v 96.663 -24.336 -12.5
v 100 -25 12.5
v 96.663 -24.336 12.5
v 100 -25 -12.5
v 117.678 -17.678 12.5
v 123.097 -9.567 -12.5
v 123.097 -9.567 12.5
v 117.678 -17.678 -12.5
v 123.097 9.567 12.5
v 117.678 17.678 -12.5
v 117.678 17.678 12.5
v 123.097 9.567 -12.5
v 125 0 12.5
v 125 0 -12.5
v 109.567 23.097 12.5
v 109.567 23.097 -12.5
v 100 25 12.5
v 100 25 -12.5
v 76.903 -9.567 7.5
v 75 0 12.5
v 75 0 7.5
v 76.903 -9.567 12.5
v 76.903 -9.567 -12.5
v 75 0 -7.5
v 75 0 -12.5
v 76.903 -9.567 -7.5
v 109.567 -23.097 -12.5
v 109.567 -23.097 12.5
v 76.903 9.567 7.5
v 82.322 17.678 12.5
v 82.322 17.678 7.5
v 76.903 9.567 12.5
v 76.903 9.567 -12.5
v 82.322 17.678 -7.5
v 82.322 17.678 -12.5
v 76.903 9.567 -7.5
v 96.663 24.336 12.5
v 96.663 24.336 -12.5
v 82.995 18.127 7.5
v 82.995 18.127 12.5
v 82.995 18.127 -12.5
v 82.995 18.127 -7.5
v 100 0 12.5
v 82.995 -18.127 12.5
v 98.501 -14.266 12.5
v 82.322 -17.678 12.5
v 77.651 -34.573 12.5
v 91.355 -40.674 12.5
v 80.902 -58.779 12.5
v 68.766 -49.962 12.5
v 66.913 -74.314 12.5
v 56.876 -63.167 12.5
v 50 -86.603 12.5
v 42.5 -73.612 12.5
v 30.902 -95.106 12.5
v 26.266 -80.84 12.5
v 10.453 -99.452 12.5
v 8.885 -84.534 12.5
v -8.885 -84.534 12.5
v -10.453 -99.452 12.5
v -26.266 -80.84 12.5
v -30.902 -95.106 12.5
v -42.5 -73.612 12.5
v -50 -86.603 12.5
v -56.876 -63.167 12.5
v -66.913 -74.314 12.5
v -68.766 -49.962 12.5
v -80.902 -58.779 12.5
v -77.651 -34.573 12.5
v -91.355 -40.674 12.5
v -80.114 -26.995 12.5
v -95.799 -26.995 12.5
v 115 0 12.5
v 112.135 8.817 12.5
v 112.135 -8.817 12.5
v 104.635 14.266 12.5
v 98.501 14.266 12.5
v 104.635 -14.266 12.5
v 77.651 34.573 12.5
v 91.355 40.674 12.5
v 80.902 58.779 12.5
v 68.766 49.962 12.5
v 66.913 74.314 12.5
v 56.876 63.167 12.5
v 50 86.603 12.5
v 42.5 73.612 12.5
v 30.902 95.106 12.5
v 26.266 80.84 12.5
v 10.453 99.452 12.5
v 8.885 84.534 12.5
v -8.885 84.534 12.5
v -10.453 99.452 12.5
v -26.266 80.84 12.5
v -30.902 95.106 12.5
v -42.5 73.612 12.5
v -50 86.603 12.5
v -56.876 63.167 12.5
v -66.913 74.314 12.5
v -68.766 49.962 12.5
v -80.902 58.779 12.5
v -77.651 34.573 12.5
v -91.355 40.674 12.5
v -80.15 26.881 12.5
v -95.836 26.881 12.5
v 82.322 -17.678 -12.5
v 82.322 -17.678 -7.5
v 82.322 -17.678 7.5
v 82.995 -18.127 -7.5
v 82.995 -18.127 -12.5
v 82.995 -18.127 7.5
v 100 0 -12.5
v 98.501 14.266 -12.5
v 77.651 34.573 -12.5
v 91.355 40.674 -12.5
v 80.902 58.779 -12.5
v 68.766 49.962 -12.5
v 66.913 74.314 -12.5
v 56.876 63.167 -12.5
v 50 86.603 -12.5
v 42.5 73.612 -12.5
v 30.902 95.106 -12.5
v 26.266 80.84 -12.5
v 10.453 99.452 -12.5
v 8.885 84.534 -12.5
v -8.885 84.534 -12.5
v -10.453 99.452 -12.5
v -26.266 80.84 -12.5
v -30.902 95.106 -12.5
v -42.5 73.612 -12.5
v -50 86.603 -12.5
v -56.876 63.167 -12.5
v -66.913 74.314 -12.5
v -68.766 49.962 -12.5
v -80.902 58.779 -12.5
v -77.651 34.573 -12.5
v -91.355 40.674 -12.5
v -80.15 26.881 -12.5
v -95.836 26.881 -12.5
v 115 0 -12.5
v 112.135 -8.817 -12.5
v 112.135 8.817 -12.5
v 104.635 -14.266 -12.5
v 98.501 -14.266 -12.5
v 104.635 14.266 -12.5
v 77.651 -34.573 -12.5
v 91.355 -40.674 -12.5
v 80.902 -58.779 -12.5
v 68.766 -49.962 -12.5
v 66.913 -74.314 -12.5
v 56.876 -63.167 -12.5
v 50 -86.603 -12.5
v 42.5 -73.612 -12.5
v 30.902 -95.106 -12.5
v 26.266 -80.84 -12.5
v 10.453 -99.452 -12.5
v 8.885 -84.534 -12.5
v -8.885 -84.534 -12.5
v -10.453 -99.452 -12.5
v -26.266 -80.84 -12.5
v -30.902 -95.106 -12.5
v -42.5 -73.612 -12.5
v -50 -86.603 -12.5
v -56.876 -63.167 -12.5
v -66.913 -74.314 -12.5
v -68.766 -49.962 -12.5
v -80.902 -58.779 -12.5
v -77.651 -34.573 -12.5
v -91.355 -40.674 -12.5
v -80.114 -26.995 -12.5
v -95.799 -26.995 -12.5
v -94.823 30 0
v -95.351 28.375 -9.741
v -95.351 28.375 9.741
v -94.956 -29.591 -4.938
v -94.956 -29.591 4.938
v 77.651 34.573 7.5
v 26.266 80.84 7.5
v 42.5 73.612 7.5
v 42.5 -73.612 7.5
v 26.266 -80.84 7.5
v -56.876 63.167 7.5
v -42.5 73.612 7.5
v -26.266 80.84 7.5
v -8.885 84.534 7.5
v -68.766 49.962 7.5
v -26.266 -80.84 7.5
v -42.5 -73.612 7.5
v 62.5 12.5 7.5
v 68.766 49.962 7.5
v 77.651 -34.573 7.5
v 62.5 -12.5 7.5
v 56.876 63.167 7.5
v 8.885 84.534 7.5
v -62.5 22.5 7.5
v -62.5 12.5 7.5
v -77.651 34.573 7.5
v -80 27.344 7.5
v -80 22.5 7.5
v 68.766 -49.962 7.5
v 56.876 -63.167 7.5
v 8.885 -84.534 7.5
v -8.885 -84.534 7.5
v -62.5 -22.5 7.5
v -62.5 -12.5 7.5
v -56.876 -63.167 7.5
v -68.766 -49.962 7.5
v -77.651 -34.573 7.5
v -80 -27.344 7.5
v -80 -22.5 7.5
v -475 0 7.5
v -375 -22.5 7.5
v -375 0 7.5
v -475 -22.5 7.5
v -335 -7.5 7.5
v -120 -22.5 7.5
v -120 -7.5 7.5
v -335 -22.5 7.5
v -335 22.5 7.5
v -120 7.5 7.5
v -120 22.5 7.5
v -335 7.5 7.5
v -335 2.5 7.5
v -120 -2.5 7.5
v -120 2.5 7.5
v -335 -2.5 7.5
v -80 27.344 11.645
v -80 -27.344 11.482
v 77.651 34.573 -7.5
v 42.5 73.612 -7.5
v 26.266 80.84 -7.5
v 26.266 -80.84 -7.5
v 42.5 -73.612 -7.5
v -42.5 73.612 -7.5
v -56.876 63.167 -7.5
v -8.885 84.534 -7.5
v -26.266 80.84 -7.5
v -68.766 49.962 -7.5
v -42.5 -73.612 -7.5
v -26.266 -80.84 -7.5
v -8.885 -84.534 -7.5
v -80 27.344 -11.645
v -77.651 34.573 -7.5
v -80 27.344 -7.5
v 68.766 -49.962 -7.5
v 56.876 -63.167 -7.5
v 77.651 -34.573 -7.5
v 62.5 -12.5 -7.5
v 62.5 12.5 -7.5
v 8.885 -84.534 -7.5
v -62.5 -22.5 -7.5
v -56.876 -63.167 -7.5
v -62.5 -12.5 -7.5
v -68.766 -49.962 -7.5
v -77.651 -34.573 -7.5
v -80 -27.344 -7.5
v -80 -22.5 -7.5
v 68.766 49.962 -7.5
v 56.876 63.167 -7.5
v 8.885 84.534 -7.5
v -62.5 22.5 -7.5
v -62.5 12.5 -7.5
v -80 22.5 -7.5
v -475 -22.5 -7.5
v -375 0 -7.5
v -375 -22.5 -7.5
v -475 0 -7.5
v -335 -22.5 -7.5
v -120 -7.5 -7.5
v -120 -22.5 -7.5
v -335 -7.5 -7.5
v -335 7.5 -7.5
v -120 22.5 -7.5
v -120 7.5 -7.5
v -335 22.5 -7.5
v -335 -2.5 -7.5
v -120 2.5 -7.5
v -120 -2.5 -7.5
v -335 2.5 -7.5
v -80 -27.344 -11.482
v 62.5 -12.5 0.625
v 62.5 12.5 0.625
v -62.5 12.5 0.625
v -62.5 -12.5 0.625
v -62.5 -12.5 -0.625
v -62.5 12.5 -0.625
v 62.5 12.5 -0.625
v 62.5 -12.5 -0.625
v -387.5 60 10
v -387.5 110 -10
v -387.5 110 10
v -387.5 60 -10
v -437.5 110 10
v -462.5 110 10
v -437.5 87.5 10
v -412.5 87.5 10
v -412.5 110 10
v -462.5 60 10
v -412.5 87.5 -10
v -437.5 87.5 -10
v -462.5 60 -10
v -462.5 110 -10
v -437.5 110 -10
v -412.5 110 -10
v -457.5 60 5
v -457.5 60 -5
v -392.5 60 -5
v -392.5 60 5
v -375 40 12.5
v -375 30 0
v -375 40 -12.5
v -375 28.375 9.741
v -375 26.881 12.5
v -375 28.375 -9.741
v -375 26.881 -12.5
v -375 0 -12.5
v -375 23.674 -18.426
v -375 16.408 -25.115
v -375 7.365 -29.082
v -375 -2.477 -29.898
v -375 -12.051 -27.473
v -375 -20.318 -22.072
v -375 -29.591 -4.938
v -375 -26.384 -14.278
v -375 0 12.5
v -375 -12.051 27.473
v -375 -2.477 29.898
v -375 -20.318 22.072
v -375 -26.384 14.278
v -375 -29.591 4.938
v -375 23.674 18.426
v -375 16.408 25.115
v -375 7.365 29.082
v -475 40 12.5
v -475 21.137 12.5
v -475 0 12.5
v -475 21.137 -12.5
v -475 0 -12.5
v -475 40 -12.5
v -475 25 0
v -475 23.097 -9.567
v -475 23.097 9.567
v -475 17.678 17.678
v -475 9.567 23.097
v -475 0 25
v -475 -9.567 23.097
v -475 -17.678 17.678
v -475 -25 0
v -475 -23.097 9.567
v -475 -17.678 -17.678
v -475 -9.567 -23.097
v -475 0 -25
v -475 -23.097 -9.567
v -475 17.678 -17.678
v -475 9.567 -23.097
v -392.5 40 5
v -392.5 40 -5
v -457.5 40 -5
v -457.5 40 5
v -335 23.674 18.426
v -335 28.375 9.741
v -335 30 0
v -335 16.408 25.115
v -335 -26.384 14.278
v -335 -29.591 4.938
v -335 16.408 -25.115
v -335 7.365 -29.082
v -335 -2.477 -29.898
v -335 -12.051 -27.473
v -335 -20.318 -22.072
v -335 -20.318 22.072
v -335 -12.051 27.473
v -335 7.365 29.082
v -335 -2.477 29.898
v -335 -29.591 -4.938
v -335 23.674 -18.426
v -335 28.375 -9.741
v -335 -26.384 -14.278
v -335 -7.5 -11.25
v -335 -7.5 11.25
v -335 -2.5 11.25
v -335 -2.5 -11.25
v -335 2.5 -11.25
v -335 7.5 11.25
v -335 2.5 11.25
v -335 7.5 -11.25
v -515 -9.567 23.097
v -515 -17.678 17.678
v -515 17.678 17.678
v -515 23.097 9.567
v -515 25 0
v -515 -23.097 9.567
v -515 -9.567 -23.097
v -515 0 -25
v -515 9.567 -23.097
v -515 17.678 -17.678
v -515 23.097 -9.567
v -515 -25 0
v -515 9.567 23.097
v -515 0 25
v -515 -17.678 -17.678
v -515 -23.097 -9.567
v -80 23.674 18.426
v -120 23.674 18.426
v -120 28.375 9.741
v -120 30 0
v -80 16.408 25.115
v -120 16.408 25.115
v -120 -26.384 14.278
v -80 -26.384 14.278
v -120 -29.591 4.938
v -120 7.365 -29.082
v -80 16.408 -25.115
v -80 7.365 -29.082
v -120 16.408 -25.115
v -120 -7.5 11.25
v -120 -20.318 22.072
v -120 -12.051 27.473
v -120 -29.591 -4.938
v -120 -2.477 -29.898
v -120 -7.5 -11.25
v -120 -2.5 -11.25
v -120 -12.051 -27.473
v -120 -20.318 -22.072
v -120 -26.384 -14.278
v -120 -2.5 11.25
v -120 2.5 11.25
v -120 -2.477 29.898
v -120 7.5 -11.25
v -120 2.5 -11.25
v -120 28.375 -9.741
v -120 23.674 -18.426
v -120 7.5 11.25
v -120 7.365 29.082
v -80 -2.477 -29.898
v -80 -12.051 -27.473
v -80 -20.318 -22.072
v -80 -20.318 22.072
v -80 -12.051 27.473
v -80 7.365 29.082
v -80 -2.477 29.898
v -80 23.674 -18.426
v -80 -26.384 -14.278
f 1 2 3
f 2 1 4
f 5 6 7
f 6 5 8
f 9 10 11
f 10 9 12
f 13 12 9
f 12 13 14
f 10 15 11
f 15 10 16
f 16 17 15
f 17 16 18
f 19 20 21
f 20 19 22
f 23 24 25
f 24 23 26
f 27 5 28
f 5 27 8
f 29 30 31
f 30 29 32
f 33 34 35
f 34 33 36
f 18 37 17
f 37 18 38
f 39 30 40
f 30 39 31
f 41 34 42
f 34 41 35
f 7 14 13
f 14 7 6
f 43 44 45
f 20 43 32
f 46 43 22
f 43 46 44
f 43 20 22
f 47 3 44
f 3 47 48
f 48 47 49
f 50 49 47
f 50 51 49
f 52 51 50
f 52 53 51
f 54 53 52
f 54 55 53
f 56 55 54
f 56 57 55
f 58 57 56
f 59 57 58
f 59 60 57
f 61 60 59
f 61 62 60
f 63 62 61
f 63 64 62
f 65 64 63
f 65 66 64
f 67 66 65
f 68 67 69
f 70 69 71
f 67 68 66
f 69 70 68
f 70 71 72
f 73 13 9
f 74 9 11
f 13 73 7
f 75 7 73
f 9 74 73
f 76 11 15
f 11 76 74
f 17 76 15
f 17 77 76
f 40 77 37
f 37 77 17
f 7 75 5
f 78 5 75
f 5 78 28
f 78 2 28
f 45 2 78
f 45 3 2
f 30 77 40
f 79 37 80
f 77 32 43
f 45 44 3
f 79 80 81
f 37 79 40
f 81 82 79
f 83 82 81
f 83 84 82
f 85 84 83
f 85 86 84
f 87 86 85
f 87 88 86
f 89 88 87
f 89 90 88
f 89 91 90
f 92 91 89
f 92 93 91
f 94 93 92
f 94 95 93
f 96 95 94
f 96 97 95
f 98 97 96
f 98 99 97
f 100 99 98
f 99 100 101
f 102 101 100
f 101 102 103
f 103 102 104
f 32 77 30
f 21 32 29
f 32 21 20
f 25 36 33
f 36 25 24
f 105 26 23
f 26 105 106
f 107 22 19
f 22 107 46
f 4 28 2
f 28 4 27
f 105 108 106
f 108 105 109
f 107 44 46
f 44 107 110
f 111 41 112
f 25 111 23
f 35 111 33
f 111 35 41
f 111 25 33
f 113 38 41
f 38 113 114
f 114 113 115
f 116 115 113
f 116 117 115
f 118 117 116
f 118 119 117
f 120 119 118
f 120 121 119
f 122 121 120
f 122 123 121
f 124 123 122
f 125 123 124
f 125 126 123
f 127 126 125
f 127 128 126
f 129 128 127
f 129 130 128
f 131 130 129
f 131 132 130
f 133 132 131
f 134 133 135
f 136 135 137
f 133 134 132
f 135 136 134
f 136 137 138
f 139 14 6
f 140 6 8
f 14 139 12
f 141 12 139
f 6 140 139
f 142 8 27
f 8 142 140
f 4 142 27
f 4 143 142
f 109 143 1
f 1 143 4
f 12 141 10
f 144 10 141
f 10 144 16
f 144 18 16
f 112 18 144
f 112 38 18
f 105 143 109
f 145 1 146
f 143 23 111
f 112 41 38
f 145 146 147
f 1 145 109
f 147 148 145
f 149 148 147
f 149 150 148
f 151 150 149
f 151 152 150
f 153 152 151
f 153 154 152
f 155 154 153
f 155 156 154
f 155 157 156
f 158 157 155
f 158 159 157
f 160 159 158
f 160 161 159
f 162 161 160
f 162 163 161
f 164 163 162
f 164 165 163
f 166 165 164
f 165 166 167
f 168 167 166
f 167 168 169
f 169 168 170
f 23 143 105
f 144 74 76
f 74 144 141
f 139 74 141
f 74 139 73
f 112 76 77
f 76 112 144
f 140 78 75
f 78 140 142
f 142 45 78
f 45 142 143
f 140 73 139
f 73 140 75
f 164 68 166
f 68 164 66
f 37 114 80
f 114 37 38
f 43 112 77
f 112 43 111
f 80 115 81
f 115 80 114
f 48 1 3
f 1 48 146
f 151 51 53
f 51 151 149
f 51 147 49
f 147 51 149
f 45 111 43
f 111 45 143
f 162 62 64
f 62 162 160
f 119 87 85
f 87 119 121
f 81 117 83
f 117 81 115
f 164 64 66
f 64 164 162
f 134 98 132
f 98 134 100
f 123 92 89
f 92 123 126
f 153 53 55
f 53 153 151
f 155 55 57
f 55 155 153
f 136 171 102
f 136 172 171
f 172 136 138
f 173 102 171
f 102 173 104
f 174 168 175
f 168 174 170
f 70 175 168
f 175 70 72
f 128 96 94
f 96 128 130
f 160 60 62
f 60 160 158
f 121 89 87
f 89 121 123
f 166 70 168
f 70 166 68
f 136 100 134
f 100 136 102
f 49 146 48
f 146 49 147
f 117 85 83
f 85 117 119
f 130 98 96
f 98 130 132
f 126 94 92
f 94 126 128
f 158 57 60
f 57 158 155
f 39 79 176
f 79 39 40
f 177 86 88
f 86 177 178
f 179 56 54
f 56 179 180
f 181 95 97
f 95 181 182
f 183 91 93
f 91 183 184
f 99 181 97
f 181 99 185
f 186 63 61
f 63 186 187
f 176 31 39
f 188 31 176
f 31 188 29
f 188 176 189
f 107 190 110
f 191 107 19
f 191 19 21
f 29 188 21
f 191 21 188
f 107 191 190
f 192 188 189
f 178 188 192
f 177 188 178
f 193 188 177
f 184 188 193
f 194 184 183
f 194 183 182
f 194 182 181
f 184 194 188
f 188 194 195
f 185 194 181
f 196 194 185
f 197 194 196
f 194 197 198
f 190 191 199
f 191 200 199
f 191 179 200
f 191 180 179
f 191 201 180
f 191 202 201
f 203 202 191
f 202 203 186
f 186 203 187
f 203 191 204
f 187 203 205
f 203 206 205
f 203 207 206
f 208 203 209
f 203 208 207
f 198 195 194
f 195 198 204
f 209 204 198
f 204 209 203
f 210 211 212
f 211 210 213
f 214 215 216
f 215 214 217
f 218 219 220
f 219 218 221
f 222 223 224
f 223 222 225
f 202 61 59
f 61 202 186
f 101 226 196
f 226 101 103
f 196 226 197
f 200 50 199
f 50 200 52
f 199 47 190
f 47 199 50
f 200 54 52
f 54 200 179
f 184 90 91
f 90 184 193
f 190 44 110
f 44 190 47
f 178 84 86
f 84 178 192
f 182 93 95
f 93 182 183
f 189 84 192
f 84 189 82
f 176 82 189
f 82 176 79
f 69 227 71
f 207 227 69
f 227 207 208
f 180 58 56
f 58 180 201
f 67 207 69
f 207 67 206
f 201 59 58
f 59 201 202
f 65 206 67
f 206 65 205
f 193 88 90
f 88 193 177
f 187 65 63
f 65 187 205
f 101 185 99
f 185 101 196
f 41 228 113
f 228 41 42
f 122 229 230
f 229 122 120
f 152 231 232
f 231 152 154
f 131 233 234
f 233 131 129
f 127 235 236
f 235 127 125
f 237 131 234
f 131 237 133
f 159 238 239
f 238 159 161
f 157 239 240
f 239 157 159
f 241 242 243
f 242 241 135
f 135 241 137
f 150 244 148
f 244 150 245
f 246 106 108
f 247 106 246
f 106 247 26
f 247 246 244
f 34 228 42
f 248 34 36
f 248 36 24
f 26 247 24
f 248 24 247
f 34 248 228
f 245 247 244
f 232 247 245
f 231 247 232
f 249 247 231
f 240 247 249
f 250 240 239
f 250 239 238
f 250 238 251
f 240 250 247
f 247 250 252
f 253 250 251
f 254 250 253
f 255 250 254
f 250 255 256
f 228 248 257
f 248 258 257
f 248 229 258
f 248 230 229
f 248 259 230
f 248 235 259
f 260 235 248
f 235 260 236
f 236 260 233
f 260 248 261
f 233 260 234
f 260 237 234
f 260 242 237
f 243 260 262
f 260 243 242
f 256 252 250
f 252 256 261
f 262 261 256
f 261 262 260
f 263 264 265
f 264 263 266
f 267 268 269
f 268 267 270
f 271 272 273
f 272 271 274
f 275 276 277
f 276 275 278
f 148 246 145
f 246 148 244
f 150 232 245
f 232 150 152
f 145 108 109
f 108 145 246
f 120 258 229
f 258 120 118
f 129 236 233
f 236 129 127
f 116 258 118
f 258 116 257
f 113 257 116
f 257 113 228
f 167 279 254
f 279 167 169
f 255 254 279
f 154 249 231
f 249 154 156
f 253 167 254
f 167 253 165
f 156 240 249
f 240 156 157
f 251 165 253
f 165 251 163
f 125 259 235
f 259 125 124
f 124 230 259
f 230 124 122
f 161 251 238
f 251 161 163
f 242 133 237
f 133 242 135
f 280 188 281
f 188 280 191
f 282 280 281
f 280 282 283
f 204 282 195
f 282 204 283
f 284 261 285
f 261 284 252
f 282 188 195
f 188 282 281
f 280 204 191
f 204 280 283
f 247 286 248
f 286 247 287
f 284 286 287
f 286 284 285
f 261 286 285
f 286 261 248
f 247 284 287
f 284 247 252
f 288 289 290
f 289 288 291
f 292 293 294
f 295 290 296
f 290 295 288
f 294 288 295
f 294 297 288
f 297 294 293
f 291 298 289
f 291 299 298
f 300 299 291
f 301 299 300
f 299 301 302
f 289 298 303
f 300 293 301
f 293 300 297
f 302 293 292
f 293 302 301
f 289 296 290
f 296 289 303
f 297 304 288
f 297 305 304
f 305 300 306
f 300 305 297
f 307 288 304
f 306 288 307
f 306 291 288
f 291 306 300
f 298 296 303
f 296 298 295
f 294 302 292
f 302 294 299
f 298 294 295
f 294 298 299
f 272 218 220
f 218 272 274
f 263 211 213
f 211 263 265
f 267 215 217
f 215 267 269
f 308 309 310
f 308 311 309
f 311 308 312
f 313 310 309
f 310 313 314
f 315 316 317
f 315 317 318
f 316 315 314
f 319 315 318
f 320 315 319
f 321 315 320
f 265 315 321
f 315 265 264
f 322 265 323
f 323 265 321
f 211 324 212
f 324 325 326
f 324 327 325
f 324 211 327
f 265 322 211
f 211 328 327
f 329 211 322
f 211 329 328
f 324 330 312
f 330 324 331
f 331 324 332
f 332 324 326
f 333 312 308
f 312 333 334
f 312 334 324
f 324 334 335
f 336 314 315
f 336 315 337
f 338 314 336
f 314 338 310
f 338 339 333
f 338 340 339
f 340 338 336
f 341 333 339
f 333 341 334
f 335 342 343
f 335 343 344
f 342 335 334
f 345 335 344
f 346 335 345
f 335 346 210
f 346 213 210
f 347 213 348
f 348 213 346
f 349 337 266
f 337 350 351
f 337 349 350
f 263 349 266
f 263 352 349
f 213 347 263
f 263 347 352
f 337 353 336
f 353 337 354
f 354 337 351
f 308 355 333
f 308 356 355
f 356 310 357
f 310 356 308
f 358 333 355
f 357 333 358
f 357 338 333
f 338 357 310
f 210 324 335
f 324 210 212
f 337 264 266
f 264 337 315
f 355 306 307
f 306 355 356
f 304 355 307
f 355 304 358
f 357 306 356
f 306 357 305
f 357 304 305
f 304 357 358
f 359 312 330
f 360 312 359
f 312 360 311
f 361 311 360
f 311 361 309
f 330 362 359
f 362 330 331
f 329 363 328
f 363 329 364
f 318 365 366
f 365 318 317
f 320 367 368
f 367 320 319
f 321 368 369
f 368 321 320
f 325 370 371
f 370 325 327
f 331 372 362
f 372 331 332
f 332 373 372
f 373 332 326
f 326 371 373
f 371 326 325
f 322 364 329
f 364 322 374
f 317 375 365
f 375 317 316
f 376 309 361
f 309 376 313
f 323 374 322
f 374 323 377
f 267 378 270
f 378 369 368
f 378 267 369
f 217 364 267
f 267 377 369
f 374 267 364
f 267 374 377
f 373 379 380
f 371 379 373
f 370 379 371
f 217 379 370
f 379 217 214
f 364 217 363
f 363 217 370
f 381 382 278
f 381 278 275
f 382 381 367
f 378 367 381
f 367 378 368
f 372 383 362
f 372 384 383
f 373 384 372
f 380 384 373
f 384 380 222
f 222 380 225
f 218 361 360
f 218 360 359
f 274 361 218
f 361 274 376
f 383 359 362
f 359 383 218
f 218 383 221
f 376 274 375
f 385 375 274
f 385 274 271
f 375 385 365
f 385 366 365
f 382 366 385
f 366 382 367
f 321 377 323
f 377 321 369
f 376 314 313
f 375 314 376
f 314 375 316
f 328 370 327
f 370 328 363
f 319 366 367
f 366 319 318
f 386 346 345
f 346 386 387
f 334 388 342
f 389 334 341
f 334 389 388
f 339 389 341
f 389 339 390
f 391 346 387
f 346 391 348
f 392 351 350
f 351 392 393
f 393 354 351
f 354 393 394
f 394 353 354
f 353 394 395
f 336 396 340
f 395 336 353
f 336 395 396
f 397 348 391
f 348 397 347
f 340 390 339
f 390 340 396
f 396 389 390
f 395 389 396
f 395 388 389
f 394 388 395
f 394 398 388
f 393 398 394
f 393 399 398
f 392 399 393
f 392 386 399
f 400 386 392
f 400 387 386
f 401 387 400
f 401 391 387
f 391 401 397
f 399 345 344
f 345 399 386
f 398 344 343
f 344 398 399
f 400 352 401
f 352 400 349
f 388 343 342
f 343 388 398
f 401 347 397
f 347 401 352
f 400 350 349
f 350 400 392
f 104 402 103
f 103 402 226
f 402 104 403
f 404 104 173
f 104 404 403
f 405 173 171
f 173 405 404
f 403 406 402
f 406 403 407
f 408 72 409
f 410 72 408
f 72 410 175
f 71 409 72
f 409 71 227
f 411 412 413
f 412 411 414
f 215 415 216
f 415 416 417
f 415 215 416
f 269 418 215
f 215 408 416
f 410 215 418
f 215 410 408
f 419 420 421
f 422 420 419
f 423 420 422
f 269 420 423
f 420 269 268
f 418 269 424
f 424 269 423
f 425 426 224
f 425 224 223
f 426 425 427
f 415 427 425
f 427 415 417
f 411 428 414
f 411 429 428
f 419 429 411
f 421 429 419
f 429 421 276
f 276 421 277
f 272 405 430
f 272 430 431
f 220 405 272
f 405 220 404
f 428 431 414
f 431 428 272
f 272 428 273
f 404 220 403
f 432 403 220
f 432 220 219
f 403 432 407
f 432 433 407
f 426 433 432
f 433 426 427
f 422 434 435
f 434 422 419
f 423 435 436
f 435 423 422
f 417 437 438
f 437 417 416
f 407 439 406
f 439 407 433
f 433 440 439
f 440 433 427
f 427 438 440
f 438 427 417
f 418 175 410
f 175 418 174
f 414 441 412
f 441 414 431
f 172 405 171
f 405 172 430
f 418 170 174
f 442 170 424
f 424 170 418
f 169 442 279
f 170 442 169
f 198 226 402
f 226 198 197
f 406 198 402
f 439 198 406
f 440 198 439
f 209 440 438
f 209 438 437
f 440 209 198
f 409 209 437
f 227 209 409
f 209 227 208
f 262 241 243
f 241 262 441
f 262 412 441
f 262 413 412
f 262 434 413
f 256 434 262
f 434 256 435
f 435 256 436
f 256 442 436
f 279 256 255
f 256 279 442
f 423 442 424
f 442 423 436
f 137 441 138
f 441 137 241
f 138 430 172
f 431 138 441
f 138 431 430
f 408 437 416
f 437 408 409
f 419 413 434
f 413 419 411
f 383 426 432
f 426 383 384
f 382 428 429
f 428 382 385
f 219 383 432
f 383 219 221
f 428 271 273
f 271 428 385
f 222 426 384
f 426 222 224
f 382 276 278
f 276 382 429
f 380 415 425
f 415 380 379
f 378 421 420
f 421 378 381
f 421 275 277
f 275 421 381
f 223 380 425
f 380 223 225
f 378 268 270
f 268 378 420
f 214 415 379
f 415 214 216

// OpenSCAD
/* 
Nabila's key
make the w,d,h the same value
maybe make it the same color as the mario coin color
*/


module thekey(){
    difference(){
    translate([20,0,0]){
        cylinder(5,5,5, center=true);
    }
    translate([20,0,0]){
    cylinder(5,3,3, center=true);
    }
}
difference(){
    cylinder(5,20,20,center=true);
    translate([0,0,2]){
      cylinder(1,17,17,center=true);
    }
    translate([0,0,-2]){
      cylinder(1,17,17,center=true);
    }
    translate([0,0,1]){
    cube([25,5,1.75], center=true);
    }
    translate([0,0,-1]){
    cube([25,5,1.75], center=true);
    }
}

translate([-55,0,0]){
cube([85,9,3], center=true); 
}
translate([-85,4,0]){
cube([20,8,5], center=true);
}
translate([-85,8,0]){
    cube([13,8,2], center=true);
}

difference(){
translate([-85,17,0]){
    cube([15,10,4], center=true);
}
    translate([-85,20,0]){
        cube([5,5,4], center=true);
    }
}

rotate([90,0,90]){
translate([0,0,-71]){
    cylinder(8,6,6,center=true);
}
}

rotate([90,0,90]){
translate([0,0,-99]){
    cylinder(8,5,5,center=true);
}
}
rotate([90,0,90]){
translate([0,0,-20]){
        cylinder(8,6,6,center=true);
    }
}

translate([-45,1,0]){
    cube([45,1,4.5], center=true);
}
translate([-45,-1,0]){
    cube([45,1,4.5], center=true);
}
}
/*just change the scale*/

scale([5,5,5]){
thekey();
}
